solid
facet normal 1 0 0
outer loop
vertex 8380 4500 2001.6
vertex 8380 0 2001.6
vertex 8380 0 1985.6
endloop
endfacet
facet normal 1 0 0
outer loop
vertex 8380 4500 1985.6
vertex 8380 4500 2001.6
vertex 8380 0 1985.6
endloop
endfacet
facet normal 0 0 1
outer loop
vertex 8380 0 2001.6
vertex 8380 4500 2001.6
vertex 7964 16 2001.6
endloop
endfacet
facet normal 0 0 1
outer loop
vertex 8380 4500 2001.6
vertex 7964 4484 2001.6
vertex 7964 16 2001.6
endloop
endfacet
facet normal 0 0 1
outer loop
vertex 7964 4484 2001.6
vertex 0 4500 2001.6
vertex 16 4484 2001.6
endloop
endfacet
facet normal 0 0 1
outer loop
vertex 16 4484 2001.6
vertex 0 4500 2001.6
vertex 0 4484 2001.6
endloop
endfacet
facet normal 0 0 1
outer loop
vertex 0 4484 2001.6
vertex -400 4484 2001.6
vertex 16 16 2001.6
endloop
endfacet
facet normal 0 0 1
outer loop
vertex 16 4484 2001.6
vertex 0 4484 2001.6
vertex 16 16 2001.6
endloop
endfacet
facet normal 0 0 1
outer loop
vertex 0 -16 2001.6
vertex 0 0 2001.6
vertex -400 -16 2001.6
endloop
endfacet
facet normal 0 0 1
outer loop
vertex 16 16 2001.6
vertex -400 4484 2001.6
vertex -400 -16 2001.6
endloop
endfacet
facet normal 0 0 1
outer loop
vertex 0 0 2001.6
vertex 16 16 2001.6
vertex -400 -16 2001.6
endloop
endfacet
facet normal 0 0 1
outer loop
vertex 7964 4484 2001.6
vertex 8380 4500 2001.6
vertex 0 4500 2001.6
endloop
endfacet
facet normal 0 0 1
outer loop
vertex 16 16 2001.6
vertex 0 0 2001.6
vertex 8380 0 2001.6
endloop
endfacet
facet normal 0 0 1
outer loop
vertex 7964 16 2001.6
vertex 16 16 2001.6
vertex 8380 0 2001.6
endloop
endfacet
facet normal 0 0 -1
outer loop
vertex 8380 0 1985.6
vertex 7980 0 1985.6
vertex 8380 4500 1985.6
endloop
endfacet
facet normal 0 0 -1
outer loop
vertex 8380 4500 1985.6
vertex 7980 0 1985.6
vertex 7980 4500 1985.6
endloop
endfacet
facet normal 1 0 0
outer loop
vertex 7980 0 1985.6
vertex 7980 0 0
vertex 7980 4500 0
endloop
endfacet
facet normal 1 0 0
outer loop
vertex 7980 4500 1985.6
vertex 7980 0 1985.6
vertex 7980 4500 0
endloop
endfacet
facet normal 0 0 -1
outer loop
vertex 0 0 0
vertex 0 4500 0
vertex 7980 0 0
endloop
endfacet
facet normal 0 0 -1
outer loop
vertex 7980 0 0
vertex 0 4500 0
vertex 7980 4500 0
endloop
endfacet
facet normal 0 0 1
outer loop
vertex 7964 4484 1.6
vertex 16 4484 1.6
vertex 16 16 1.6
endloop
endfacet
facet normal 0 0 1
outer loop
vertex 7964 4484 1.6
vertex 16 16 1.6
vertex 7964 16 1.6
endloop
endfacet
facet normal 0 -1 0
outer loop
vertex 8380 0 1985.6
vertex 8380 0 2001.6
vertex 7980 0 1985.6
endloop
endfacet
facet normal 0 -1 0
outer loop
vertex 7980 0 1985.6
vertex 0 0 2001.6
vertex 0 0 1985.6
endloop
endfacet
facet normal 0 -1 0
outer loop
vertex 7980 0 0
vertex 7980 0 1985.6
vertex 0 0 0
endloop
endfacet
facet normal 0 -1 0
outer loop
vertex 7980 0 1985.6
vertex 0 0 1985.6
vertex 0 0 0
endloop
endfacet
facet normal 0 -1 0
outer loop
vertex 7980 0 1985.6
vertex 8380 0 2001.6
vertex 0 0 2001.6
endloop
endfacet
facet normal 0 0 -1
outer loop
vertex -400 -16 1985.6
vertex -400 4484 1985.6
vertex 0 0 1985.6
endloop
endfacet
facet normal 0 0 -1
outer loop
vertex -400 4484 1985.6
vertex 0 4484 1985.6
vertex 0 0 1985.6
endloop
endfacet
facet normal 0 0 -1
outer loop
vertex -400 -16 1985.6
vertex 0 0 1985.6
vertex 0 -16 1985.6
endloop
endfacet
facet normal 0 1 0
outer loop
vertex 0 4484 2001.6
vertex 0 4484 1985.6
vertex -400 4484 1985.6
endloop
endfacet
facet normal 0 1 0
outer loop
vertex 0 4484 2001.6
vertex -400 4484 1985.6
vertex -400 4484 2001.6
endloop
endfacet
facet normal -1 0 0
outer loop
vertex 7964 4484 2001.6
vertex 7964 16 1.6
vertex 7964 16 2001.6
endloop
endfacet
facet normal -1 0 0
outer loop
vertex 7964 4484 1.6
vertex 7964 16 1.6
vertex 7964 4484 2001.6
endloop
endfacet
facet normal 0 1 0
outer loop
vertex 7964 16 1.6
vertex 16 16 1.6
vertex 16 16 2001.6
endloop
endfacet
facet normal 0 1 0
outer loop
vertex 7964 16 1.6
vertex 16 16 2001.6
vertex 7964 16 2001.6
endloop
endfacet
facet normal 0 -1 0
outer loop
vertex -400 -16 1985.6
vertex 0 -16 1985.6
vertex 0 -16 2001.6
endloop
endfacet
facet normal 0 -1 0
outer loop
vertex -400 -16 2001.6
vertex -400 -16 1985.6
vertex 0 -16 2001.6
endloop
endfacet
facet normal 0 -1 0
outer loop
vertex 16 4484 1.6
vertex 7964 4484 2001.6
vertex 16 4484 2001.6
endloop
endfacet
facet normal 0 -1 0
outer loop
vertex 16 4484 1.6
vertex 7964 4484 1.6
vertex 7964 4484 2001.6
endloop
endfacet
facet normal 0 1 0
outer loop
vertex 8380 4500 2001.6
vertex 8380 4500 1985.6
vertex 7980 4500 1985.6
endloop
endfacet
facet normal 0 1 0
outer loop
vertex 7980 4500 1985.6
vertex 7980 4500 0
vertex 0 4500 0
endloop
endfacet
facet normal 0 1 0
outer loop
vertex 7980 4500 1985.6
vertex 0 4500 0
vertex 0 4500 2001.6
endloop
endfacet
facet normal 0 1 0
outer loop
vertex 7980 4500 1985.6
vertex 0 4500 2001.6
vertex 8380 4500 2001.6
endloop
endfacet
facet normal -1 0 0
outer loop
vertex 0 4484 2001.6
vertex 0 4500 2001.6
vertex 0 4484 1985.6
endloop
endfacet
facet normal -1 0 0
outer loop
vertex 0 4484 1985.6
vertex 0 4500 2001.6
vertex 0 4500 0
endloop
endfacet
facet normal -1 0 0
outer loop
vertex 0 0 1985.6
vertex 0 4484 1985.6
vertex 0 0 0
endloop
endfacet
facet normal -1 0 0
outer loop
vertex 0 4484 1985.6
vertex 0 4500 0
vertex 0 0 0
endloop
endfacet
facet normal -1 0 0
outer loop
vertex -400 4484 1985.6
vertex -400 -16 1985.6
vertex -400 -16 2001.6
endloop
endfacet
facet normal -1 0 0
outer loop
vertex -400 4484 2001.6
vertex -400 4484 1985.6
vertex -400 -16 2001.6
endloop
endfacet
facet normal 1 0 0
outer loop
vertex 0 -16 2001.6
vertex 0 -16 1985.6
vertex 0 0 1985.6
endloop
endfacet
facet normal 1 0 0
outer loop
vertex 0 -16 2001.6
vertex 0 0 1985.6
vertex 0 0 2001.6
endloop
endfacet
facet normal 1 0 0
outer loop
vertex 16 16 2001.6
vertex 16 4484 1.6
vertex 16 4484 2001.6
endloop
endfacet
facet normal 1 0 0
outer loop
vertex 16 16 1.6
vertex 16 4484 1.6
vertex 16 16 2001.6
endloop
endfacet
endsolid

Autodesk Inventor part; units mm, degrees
ref_plane "YZ Plane" through (0, 0, 0) normal (1, 0, 0) x (0, 1, 0)
ref_plane "XZ Plane" through (0, 0, 0) normal (0, 1, 0) x (-1, 0, 0)
ref_plane "XY Plane" through (0, 0, 0) normal (0, 0, 1) x (1, 0, 0)
sketch "Sketch1" plane through (0, 0, 0) normal (0, 0, 1) x (1, 0, 0)
  line L0 (0, 0) -> (7980, 0)
  line L1 (7980, 0) -> (7980, 4500)
  line L2 (7980, 4500) -> (0, 4500)
  line L3 (0, 4500) -> (0, 0)
  dimension "d0" = 7980
  dimension "d1" = 4500
extrude "Extrusion1" add sketch "Sketch1" along normal blind 1.6
sketch "Sketch2" plane through (0, 0, 1.6) normal (0, 0, 1) x (1, 0, 0)
  line L0 (7980, 4500) -> (0, 4500) projected
  line L1 (0, 0) -> (7980, 0) projected
  line L2 (0, 4500) -> (7980, 4500)
  line L3 (7980, 4500) -> (7980, 0)
  line L4 (7980, 0) -> (0, 0)
  line L5 (0, 0) -> (0, 4500)
  line L6 (7964, 4484) -> (16, 4484)
  line L7 (16, 4484) -> (16, 16)
  line L8 (16, 16) -> (7964, 16)
  line L9 (7964, 16) -> (7964, 4484)
  dimension "d4" = 16
extrude "Extrusion2" add sketch "Sketch2" along normal blind 2000
sketch "Sketch3" plane through (0, 0, 0) normal (-1, 0, 0) x (0, 0, 1)
  line L0 (1.6, 4484) -> (2001.6, 4484) projected
  line L1 (2001.6, 4484) -> (1985.6, 4484)
  line L2 (1985.6, 4484) -> (1985.6, -16)
  line L3 (1985.6, -16) -> (2001.6, -16)
  line L4 (2001.6, -16) -> (2001.6, 4484)
  point P0 (0, 0)
  dimension "d7" = 16
  dimension "d8" = 4500
extrude "Extrusion3" add sketch "Sketch3" along normal blind 400
sketch "Sketch4" plane through (7980, 0, 0) normal (1, 0, 0) x (0, 0, -1)
  line L0 (-2001.6, -16) -> (-2001.6, 0) projected
  line L1 (-2001.6, 0) -> (-1985.6, 0)
  line L2 (-1985.6, 0) -> (-1985.6, 4500)
  line L3 (-1985.6, 4500) -> (-2001.6, 4500)
  line L4 (-2001.6, 4500) -> (-2001.6, 0)
  point P0 (0, 0)
  dimension "d11" = 16
  dimension "d12" = 4500
extrude "Extrusion4" add sketch "Sketch4" along normal blind 400
properties part number "coolant tray" material "Steel"
